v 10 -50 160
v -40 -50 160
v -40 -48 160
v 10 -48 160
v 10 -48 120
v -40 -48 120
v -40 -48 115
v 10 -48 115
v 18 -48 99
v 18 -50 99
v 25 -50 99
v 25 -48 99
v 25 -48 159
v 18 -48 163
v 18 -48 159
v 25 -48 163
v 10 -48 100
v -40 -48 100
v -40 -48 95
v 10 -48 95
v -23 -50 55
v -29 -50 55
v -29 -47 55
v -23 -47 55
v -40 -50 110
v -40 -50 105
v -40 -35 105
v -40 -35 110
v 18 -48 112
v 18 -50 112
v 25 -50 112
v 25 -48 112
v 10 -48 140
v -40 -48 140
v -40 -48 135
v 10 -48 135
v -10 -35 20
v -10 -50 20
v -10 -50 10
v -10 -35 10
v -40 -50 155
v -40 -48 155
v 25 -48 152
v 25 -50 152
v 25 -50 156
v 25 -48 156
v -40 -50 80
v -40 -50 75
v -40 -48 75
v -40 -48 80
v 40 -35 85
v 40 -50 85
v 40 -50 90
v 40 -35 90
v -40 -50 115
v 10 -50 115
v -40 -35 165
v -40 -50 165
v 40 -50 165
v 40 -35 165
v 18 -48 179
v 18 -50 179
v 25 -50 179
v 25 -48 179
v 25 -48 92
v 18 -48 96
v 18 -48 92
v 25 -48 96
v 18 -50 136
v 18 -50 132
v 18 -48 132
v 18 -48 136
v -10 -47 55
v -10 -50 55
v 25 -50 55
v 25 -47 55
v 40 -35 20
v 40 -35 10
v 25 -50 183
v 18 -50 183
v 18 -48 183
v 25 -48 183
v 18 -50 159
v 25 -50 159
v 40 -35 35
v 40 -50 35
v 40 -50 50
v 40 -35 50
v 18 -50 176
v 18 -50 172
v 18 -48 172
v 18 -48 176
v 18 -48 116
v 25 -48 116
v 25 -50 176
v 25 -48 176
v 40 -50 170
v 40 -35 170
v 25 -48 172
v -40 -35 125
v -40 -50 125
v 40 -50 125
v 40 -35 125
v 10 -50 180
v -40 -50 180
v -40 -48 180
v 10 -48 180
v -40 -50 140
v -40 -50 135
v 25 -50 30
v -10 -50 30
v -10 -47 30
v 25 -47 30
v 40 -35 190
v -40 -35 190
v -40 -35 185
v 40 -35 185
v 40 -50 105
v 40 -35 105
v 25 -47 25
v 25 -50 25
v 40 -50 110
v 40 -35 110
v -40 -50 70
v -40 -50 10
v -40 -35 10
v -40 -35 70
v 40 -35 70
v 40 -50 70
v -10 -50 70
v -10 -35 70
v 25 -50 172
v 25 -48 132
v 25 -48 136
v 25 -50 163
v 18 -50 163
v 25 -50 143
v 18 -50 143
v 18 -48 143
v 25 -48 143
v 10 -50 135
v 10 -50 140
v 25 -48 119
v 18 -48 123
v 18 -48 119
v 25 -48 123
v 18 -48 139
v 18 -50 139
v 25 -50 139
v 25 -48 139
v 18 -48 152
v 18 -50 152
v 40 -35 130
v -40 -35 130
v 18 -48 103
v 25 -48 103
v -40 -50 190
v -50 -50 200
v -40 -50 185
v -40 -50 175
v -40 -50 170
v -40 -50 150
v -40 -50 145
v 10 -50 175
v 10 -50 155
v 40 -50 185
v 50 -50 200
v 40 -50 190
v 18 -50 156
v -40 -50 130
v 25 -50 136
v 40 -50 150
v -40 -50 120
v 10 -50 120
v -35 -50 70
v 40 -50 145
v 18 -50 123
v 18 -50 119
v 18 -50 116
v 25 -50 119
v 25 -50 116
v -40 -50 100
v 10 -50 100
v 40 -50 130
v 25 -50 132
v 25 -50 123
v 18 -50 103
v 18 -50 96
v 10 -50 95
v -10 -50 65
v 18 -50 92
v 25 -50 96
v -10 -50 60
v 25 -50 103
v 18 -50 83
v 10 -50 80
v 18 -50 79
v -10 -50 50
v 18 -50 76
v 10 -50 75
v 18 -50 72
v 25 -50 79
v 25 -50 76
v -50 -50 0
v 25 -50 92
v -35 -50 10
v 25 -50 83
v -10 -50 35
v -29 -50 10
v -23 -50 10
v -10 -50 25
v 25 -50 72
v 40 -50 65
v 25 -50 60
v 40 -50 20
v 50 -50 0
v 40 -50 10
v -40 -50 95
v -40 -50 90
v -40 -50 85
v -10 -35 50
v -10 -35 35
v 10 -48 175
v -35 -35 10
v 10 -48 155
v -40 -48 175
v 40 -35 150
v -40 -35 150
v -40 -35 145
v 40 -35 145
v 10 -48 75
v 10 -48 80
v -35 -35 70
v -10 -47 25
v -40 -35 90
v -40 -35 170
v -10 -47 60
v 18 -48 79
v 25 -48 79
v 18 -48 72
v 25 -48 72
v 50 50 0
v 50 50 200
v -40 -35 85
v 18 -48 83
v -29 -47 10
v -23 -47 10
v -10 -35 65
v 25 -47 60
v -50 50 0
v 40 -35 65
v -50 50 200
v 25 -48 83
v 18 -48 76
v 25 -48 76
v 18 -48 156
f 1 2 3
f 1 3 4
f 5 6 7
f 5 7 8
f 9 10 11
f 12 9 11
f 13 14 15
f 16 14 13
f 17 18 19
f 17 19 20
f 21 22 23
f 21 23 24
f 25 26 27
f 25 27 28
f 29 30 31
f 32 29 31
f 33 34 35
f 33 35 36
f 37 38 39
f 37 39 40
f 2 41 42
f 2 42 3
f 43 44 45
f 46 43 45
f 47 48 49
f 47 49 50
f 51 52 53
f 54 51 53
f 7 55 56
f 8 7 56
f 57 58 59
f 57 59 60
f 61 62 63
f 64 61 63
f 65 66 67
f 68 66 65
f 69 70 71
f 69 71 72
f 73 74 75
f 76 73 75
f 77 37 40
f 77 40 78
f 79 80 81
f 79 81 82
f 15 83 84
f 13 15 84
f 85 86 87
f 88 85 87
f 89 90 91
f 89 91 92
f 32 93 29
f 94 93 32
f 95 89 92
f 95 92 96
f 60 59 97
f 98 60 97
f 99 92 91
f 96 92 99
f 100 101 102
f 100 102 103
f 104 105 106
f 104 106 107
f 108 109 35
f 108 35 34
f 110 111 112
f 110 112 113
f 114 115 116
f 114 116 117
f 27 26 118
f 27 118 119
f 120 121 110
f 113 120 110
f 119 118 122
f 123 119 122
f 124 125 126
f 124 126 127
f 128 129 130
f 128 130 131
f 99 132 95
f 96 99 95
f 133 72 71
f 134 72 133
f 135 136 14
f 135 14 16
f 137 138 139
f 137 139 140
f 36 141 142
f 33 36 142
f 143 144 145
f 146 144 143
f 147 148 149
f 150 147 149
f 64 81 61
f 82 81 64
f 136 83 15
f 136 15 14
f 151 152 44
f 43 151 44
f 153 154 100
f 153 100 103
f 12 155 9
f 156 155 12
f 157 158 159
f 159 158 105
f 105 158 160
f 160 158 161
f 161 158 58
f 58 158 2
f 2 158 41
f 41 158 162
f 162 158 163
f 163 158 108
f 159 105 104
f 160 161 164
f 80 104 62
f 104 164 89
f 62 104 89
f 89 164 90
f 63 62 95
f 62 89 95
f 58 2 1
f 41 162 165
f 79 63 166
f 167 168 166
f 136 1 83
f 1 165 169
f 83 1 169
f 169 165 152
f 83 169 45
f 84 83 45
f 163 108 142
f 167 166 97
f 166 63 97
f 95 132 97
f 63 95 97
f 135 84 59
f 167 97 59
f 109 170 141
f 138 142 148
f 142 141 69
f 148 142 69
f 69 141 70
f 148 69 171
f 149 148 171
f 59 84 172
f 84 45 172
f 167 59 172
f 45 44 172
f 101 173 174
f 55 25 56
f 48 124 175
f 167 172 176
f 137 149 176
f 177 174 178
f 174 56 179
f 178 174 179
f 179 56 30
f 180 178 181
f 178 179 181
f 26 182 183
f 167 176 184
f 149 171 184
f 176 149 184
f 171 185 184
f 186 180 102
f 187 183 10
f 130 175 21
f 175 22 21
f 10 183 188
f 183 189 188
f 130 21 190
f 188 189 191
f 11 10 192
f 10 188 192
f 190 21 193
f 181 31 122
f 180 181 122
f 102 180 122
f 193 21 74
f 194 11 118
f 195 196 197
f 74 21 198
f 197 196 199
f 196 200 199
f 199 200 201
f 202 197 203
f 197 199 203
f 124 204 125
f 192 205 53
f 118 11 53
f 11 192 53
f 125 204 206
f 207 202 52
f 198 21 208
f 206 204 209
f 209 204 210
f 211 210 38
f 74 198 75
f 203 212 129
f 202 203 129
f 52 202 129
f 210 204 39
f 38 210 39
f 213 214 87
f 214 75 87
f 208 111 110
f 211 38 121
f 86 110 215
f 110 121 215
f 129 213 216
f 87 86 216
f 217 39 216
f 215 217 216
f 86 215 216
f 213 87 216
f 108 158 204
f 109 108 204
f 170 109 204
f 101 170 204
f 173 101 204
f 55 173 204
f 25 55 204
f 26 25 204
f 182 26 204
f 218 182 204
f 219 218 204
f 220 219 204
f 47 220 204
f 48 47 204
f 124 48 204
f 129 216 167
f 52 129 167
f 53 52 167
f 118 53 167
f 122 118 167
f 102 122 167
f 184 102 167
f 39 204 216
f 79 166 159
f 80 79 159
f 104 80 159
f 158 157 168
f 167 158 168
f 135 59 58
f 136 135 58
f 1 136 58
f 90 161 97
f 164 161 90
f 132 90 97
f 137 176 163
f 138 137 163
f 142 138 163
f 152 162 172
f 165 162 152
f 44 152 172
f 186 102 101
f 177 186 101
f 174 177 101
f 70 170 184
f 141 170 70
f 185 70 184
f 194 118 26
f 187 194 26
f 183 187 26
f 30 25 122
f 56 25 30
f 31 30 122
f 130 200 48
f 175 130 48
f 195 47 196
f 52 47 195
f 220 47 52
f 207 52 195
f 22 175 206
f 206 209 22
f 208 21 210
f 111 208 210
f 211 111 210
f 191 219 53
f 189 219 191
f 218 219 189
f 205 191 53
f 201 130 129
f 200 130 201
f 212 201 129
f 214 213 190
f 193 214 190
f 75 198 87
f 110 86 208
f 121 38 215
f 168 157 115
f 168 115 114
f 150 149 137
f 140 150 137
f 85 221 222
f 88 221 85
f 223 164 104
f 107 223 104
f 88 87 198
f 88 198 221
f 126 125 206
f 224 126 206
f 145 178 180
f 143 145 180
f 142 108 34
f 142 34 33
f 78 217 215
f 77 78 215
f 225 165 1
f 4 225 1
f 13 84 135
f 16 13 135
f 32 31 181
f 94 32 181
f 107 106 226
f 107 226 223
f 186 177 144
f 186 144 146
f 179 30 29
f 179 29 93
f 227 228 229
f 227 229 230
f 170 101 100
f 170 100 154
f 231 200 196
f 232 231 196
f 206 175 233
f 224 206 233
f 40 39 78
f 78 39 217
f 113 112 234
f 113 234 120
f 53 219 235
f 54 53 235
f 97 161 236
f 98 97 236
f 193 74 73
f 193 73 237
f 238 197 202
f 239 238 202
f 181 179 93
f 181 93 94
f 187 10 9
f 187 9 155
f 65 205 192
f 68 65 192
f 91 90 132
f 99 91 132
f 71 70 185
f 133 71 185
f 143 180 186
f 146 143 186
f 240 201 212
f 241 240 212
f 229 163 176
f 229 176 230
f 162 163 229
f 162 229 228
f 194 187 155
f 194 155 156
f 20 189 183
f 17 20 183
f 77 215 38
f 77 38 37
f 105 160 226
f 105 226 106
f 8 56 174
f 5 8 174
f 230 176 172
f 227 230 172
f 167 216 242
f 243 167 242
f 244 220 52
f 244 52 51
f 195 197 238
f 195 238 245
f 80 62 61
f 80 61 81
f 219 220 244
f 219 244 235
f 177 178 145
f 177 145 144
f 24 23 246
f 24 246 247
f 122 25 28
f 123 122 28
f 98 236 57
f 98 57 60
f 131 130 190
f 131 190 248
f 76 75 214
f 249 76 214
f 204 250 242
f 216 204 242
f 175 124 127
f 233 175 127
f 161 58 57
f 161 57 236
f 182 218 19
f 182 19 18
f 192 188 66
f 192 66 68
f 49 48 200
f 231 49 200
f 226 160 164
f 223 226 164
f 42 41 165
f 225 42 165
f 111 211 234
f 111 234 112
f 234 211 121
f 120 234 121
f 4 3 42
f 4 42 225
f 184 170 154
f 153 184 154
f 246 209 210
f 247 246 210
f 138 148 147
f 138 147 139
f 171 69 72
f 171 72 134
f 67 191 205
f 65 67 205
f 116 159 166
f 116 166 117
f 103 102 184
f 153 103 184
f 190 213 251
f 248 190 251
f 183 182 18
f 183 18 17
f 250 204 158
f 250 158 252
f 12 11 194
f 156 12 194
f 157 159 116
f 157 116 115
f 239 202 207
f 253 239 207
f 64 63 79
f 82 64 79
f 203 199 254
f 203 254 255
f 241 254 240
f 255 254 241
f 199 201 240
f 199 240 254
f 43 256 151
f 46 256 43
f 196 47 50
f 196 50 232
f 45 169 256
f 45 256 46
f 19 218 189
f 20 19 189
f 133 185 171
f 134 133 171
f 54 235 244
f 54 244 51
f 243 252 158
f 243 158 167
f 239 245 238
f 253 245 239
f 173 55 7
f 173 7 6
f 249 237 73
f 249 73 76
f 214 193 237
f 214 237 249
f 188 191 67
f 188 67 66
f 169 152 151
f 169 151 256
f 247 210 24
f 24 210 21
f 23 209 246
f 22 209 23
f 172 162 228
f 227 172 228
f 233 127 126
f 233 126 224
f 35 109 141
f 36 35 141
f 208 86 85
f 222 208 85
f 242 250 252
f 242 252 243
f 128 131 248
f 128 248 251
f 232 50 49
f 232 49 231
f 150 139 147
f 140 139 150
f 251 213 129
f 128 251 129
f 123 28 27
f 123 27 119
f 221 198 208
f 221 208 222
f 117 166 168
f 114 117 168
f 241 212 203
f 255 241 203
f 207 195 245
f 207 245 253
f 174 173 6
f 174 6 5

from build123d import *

# Parameters (mm, degrees)
ESQUISSE1_W                = 100
ESQUISSE1_H                = 100
BOSS_EXTRU_1_DEPTH         = 200
ESQUISSE2_W                = 80
ESQUISSE2_H                = 180
ENL_V_MAT_EXTRU_1_DEPTH    = 15
ESQUISSE3_W                = 15
ESQUISSE3_H                = 15
BOSS_EXTRU_2_DEPTH         = 80
R_P_TITION_LIN_AIRE1_COUNT = 6
R_P_TITION_LIN_AIRE1_PITCH = 20
ESQUISSE4_W                = 50
ESQUISSE4_H                = 5
ESQUISSE4_W_2              = 7
ESQUISSE4_H_2              = 4
ENL_V_MAT_EXTRU_2_DEPTH    = 2
R_P_TITION_LIN_AIRE2_COUNT = 6
R_P_TITION_LIN_AIRE2_PITCH = 20
ESQUISSE5_W                = 25
ESQUISSE5_H                = 15
BOSS_EXTRU_3_DEPTH         = 60
ESQUISSE6_W                = 15
ESQUISSE6_H                = 15
BOSS_EXTRU_4_DEPTH         = 50
R_P_TITION_LIN_AIRE3_COUNT = 2
R_P_TITION_LIN_AIRE3_PITCH = 30
ESQUISSE7_W                = 6
ESQUISSE7_H                = 45
ESQUISSE7_W_2              = 35
ESQUISSE7_H_2              = 5
ENL_V_MAT_EXTRU_3_DEPTH    = 3


with BuildPart() as part:
    # Esquisse1 → Boss.-Extru.1 (new body)
    with BuildSketch(Plane.XY):
        Rectangle(ESQUISSE1_W, ESQUISSE1_H)
    extrude(amount=BOSS_EXTRU_1_DEPTH)

    # Esquisse2 → Enlèv. mat.-Extru.1 (cut)
    with BuildSketch(Plane.XZ.offset(50)):
        with Locations((0, 100)):
            Rectangle(ESQUISSE2_W, ESQUISSE2_H)
    extrude(amount=-ENL_V_MAT_EXTRU_1_DEPTH, mode=Mode.SUBTRACT)

    # Esquisse3 → Boss.-Extru.2 (add)
    with BuildSketch(Plane(origin=(-40, 0, 0), x_dir=(0, 0, -1), z_dir=(1, 0, 0))):
        with Locations((-177.5, -42.5)):
            Rectangle(ESQUISSE3_W, ESQUISSE3_H)
    boss_extru_2 = extrude(amount=BOSS_EXTRU_2_DEPTH)

    # Répétition linéaire1: Boss.-Extru.2 ×6
    with Locations(*[(0, 0, -i * R_P_TITION_LIN_AIRE1_PITCH) for i in range(1, R_P_TITION_LIN_AIRE1_COUNT)]):
        add(boss_extru_2)

    # Esquisse4 → Enlèv. mat.-Extru.2 (cut)
    with BuildSketch(Plane.XZ.offset(50)):
        with Locations((-15, 177.5)):
            Rectangle(ESQUISSE4_W, ESQUISSE4_H)
        with Locations((21.5, 181)):
            Rectangle(ESQUISSE4_W_2, ESQUISSE4_H_2)
        with Locations((21.5, 174)):
            Rectangle(ESQUISSE4_W_2, ESQUISSE4_H_2)
    enl_v_mat_extru_2 = extrude(amount=-ENL_V_MAT_EXTRU_2_DEPTH, mode=Mode.SUBTRACT)

    # Répétition linéaire2: Enlèv. mat.-Extru.2 ×6
    with Locations(*[(0, 0, -i * R_P_TITION_LIN_AIRE2_PITCH) for i in range(1, R_P_TITION_LIN_AIRE2_COUNT)]):
        add(enl_v_mat_extru_2, mode=Mode.SUBTRACT)

    # Esquisse5 → Boss.-Extru.3 (add)
    with BuildSketch(Plane(origin=(0, 0, 70), x_dir=(-1, 0, 0), z_dir=(0, 0, -1))):
        with Locations((22.5, -42.5)):
            Rectangle(ESQUISSE5_W, ESQUISSE5_H)
    extrude(amount=BOSS_EXTRU_3_DEPTH)

    # Esquisse6 → Boss.-Extru.4 (add)
    with BuildSketch(Plane(origin=(-10, 0, 0), x_dir=(0, 0, -1), z_dir=(1, 0, 0))):
        with Locations((-57.5, -42.5)):
            Rectangle(ESQUISSE6_W, ESQUISSE6_H)
    boss_extru_4 = extrude(amount=BOSS_EXTRU_4_DEPTH)

    # Répétition linéaire3: Boss.-Extru.4 ×2
    with Locations(*[(0, 0, -i * R_P_TITION_LIN_AIRE3_PITCH) for i in range(1, R_P_TITION_LIN_AIRE3_COUNT)]):
        add(boss_extru_4)

    # Esquisse7 → Enlèv. mat.-Extru.3 (cut)
    with BuildSketch(Plane.XZ.offset(50)):
        with Locations((-26, 32.5)):
            Rectangle(ESQUISSE7_W, ESQUISSE7_H)
        with Locations((7.5, 57.5)):
            Rectangle(ESQUISSE7_W_2, ESQUISSE7_H_2)
        with Locations((7.5, 27.5)):
            Rectangle(ESQUISSE7_W_2, ESQUISSE7_H_2)
    extrude(amount=-ENL_V_MAT_EXTRU_3_DEPTH, mode=Mode.SUBTRACT)


solid = part.part
